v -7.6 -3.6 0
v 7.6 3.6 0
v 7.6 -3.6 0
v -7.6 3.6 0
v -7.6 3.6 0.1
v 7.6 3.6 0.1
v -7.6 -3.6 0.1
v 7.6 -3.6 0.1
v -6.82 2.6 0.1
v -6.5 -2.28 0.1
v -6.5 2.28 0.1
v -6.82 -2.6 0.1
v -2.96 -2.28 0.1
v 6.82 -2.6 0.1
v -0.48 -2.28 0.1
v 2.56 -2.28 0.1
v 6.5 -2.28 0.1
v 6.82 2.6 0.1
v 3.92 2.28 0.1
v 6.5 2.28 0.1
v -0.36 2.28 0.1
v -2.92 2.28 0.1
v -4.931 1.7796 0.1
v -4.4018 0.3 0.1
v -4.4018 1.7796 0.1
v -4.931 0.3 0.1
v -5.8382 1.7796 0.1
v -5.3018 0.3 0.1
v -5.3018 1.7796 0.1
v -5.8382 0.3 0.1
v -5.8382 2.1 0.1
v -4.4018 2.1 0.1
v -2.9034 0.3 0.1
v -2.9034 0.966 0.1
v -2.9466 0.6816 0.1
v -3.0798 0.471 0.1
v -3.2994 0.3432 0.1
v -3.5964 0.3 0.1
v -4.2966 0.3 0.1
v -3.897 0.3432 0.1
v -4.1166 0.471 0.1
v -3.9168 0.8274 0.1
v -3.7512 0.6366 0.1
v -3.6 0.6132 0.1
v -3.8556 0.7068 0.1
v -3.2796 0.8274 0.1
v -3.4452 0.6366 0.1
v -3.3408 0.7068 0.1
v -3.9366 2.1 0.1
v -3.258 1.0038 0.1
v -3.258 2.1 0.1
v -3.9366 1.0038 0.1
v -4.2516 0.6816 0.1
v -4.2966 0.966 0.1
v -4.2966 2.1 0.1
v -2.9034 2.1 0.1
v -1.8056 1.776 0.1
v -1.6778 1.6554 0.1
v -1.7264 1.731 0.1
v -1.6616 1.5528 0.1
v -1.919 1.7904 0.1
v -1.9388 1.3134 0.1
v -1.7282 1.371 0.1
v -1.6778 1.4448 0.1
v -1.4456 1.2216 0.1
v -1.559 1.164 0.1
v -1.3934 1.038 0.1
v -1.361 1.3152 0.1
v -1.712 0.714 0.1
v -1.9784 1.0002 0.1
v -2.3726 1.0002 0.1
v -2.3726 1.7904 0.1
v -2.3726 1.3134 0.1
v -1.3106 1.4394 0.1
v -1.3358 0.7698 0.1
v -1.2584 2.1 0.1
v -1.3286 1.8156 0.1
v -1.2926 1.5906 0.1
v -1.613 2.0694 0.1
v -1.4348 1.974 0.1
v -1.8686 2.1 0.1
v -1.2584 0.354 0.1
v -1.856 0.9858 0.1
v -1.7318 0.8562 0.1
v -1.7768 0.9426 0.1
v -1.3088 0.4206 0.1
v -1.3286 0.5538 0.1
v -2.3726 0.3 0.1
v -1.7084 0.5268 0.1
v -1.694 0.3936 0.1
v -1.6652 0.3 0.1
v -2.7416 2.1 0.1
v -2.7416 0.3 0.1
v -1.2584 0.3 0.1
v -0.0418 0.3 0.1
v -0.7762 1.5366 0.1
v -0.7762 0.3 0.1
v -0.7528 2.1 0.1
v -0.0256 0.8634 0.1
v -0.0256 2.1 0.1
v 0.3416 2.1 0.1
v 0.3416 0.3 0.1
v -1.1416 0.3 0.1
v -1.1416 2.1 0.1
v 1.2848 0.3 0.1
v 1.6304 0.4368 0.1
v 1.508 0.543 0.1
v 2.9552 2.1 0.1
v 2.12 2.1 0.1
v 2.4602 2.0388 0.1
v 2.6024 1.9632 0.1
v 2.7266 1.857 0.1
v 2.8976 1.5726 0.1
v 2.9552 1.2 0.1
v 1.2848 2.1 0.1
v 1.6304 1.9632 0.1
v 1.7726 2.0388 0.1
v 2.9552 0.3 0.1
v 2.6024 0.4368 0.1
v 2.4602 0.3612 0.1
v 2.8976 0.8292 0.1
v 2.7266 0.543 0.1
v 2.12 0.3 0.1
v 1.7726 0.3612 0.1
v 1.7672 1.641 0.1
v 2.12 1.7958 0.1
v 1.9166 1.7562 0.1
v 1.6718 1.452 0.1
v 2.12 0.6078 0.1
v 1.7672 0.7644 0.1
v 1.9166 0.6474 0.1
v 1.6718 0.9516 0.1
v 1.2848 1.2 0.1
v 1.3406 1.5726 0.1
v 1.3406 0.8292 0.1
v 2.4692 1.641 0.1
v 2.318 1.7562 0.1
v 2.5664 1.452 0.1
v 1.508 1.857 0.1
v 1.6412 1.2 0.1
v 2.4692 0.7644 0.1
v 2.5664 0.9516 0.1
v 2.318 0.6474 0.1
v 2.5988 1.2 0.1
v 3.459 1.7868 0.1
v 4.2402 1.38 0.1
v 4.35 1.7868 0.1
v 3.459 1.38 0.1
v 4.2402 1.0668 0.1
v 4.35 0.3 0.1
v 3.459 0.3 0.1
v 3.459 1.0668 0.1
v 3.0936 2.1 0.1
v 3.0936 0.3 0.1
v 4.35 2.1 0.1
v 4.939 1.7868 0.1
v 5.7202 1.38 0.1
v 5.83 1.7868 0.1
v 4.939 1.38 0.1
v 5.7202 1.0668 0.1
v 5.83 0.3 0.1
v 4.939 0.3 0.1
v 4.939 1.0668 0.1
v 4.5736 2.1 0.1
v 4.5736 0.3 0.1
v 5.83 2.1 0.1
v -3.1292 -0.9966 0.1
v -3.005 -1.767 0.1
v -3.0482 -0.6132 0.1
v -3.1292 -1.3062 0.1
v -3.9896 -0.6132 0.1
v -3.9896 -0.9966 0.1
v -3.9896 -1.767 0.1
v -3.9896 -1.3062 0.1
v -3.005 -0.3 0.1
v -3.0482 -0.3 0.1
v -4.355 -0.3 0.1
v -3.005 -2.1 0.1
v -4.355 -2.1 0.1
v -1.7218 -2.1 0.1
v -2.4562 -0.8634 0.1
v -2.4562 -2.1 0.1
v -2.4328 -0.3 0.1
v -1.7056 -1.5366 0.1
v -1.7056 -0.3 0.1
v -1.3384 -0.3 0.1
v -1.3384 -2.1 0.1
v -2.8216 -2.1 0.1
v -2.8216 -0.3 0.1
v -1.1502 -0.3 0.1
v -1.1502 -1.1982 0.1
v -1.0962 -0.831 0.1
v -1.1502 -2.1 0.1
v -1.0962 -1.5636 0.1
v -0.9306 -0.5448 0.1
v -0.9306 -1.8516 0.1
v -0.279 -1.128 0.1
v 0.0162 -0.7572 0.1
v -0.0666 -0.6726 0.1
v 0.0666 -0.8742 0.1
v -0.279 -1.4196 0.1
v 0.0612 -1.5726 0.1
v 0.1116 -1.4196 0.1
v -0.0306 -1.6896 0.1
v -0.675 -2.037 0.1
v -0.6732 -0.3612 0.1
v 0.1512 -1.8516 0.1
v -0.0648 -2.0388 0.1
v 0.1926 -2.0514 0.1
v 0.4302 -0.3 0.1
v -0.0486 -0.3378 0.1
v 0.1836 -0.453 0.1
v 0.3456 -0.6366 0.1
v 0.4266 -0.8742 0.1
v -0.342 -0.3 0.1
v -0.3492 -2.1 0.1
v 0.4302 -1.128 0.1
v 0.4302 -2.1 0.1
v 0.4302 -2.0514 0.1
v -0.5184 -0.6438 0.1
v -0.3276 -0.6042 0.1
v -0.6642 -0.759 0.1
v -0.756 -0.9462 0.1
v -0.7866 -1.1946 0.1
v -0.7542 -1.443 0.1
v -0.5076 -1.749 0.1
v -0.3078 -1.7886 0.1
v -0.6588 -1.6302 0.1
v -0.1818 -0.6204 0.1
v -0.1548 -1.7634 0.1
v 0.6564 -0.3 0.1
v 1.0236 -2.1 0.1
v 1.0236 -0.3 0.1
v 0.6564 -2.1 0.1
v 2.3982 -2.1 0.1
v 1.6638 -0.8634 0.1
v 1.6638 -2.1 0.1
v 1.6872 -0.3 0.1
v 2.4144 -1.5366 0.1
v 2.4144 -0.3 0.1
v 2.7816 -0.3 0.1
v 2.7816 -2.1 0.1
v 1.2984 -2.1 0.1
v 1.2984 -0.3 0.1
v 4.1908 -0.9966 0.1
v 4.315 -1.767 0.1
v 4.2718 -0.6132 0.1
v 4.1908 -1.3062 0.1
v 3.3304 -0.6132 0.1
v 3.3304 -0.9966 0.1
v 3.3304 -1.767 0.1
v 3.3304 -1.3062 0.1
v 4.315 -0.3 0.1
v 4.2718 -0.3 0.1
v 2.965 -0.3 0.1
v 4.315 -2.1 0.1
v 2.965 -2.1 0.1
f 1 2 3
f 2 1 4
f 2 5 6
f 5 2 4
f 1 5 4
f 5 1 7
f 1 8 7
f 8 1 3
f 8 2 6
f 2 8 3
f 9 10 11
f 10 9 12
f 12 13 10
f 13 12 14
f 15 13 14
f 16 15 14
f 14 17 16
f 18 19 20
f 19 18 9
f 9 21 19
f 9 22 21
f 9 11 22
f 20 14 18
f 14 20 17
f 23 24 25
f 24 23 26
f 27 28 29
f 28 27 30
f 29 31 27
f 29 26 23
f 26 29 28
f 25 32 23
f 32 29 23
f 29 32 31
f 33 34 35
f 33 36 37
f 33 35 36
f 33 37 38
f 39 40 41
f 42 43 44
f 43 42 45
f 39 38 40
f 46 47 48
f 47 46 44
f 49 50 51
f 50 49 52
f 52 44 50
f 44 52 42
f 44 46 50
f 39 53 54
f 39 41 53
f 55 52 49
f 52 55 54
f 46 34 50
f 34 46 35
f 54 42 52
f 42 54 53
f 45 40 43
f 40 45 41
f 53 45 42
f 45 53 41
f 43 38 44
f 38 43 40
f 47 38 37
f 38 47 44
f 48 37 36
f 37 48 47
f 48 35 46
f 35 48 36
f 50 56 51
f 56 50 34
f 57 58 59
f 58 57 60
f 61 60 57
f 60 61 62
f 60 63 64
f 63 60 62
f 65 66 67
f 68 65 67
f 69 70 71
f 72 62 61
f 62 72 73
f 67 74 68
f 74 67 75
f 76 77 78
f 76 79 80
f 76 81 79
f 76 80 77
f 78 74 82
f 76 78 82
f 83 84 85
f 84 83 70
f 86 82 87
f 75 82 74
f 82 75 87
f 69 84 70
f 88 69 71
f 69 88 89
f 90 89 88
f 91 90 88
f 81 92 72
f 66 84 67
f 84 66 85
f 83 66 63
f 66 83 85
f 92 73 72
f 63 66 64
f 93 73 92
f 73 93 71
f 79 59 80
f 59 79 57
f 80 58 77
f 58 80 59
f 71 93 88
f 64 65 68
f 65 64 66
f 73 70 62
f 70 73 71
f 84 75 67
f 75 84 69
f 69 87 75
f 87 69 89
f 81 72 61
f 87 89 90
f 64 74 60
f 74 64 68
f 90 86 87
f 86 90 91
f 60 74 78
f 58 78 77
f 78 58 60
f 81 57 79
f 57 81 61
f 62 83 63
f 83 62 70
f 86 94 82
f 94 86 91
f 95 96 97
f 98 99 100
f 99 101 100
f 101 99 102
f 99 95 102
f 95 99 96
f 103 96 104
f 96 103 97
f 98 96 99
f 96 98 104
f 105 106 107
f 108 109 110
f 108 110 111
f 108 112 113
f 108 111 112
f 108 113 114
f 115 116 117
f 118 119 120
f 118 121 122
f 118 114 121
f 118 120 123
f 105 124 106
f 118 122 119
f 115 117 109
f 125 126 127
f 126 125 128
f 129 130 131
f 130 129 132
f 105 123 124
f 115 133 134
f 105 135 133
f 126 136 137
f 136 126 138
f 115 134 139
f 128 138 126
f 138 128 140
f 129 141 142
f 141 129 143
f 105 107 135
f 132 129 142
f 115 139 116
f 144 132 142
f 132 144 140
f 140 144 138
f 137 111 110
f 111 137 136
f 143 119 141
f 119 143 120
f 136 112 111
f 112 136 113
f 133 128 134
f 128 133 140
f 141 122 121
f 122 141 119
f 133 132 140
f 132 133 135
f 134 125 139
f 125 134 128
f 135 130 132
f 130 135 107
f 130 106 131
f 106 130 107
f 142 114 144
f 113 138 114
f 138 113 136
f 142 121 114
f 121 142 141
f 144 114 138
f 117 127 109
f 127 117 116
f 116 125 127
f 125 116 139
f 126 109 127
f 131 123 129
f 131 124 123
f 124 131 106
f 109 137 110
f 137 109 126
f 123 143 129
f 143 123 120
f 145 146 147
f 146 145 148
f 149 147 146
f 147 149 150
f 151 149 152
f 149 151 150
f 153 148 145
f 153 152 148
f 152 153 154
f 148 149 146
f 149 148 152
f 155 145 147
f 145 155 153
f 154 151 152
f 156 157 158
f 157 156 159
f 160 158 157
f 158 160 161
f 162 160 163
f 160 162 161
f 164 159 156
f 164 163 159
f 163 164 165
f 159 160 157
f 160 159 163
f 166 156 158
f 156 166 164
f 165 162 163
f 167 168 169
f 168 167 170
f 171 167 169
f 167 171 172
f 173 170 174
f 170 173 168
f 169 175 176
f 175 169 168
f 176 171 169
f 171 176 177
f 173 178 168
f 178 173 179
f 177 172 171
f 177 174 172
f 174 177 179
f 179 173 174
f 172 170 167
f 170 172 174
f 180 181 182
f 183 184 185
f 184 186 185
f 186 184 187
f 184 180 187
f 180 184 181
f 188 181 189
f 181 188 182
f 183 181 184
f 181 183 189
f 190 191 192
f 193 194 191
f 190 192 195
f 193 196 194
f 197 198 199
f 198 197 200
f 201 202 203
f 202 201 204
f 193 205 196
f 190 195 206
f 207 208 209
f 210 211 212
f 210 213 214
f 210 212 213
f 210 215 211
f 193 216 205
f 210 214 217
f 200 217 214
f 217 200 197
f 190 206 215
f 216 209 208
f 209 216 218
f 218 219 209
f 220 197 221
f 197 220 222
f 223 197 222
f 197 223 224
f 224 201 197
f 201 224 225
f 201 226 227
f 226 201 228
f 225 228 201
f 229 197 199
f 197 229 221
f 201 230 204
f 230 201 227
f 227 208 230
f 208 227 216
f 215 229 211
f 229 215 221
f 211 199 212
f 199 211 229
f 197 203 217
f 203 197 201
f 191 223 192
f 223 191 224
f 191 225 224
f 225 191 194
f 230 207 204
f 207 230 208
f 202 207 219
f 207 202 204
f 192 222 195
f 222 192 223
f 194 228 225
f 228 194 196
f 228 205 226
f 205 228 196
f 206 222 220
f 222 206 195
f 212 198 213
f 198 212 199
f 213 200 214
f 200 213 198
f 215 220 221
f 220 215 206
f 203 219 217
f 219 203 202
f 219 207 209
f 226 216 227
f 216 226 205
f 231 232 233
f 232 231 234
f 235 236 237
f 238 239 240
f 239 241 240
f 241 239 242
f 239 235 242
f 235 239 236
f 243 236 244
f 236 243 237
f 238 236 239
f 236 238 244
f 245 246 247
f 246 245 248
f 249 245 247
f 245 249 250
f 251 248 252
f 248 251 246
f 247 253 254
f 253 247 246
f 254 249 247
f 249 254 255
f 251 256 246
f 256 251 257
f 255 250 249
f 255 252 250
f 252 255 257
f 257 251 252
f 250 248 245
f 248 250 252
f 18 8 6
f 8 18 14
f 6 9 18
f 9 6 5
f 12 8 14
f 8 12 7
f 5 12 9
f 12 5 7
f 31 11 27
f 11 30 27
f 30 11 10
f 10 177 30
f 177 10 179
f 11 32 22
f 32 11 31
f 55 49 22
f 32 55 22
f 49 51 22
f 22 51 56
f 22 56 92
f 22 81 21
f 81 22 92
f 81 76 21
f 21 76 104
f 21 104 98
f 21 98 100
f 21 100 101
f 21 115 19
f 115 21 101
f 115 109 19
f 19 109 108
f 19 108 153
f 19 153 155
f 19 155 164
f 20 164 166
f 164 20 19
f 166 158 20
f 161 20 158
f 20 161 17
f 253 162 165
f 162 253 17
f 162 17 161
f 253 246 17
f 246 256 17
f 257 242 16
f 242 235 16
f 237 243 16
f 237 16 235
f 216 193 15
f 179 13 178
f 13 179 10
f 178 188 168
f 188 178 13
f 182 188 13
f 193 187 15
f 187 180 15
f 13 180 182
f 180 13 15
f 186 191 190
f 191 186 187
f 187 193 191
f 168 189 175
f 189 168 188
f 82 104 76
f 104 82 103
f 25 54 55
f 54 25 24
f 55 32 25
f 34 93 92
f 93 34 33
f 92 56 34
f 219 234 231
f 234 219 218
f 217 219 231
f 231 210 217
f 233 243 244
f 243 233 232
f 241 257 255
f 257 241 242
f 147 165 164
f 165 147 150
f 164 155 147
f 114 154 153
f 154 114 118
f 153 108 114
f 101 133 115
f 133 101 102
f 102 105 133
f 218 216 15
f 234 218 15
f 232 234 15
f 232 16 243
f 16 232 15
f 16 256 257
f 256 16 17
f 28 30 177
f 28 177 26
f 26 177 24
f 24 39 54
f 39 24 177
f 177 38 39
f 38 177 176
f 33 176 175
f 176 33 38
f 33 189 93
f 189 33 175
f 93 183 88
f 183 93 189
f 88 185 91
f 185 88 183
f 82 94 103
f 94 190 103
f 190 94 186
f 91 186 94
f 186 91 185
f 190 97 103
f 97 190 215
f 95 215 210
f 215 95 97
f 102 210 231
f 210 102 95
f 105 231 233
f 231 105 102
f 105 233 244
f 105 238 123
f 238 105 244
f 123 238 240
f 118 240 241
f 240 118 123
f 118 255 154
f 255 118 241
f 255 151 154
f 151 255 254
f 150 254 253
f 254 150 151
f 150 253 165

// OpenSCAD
use <../lib.scad>
use <../p/box5-12.scad>
use <../p/type-swiss721bt-bold-ue.scad>
use <../p/type-swiss721bt-bold-uf.scad>
use <../p/type-swiss721bt-bold-ug.scad>
use <../p/type-swiss721bt-bold-ui.scad>
use <../p/type-swiss721bt-bold-un.scad>
use <../p/type-swiss721bt-bold-uo.scad>
use <../p/type-swiss721bt-bold-ur.scad>
use <../p/type-swiss721bt-bold-ut.scad>
use <../p/type-swiss721bt-bold-uu.scad>
$fa=1; $fs=0.2;
function ldraw_lib__193445e(realsolid=false) = [
// 0 Sticker  0.9 x  1.9 with Black "TURN OFF ENGINE" and Frame on Clear Background
// 0 Name: 193445e.dat
// 0 Author: Ulrich Röder [UR]
// 0 !LDRAW_ORG Part UPDATE 2020-03
// 0 !LICENSE Licensed under CC BY 2.0 and CC BY 4.0 : see CAreadme.txt
// 
// 0 BFC CERTIFY CCW
  [0,"BFC","CERTIFY"],
  [0,"BFC","CCW"],
// 
// 0 !KEYWORDS Set 5590
// 
// 0 !HISTORY 2018-12-08 [PTadmin] Official Update 2018-02
// 0 !HISTORY 2020-12-08 [UR] Bold Text and Frame, Primitives, Dimensions
// 0 !HISTORY 2020-12-29 [PTadmin] Official Update 2020-03
// 
// 
// 0 // Main
// 1 16 0 -0.25 0 19 0 0 0 0.25 0 0 0 9 box5-12.dat
  [1,16,0,-0.25,0,19,0,0,0,0.25,0,0,0,9, ldraw_lib__box5_12(realsolid)],
// 
// 4 0 -16.25 -.25 -5.7 -16.25 -.25 5.7 -17.05 -.25 6.5 -17.05 -.25 -6.5
  [4,0,-16.25,-.25,-5.7,-16.25,-.25,5.7,-17.05,-.25,6.5,-17.05,-.25,-6.5],
// 4 0 -7.4 -.25 -5.7 -16.25 -.25 -5.7 -17.05 -.25 -6.5 17.05 -.25 -6.5
  [4,0,-7.4,-.25,-5.7,-16.25,-.25,-5.7,-17.05,-.25,-6.5,17.05,-.25,-6.5],
// 3 0 -1.2 -.25 -5.7 -7.4 -.25 -5.7 17.05 -.25 -6.5
  [3,0,-1.2,-.25,-5.7,-7.4,-.25,-5.7,17.05,-.25,-6.5],
// 3 0 6.4 -.25 -5.7 -1.2 -.25 -5.7 17.05 -.25 -6.5
  [3,0,6.4,-.25,-5.7,-1.2,-.25,-5.7,17.05,-.25,-6.5],
// 3 0 17.05 -.25 -6.5 16.25 -.25 -5.7 6.4 -.25 -5.7
  [3,0,17.05,-.25,-6.5,16.25,-.25,-5.7,6.4,-.25,-5.7],
// 4 0 9.8 -.25 5.7 16.25 -.25 5.7 17.05 -.25 6.5 -17.05 -.25 6.5
  [4,0,9.8,-.25,5.7,16.25,-.25,5.7,17.05,-.25,6.5,-17.05,-.25,6.5],
// 3 0 -17.05 -.25 6.5 -.9 -.25 5.7 9.8 -.25 5.7
  [3,0,-17.05,-.25,6.5,-.9,-.25,5.7,9.8,-.25,5.7],
// 3 0 -17.05 -.25 6.5 -7.3 -.25 5.7 -.9 -.25 5.7
  [3,0,-17.05,-.25,6.5,-7.3,-.25,5.7,-.9,-.25,5.7],
// 3 0 -17.05 -.25 6.5 -16.25 -.25 5.7 -7.3 -.25 5.7
  [3,0,-17.05,-.25,6.5,-16.25,-.25,5.7,-7.3,-.25,5.7],
// 4 0 16.25 -.25 -5.7 17.05 -.25 -6.5 17.05 -.25 6.5 16.25 -.25 5.7
  [4,0,16.25,-.25,-5.7,17.05,-.25,-6.5,17.05,-.25,6.5,16.25,-.25,5.7],
// 
// 0 // Text
// 1 16 -12.8 -.25 3 4.5 0 0 0 1 0 0 0 4.5 type-swiss721bt-bold-ut.dat
  [1,16,-12.8,-.25,3,4.5,0,0,0,1,0,0,0,4.5, ldraw_lib__type_swiss721bt_bold_ut(realsolid)],
// 1 16 -9 -.25 3 4.5 0 0 0 1 0 0 0 4.5 type-swiss721bt-bold-uu.dat
  [1,16,-9,-.25,3,4.5,0,0,0,1,0,0,0,4.5, ldraw_lib__type_swiss721bt_bold_uu(realsolid)],
// 1 16 -5 -.25 3 4.5 0 0 0 1 0 0 0 4.5 type-swiss721bt-bold-ur.dat
  [1,16,-5,-.25,3,4.5,0,0,0,1,0,0,0,4.5, ldraw_lib__type_swiss721bt_bold_ur(realsolid)],
// 1 16 -1 -.25 3 4.5 0 0 0 1 0 0 0 4.5 type-swiss721bt-bold-un.dat
  [1,16,-1,-.25,3,4.5,0,0,0,1,0,0,0,4.5, ldraw_lib__type_swiss721bt_bold_un(realsolid)],
// 1 16 5.3 -.25 3 4.5 0 0 0 1 0 0 0 4.5 type-swiss721bt-bold-uo.dat
  [1,16,5.3,-.25,3,4.5,0,0,0,1,0,0,0,4.5, ldraw_lib__type_swiss721bt_bold_uo(realsolid)],
// 1 16 9.3 -.25 3 4.5 0 0 0 1 0 0 0 4.5 type-swiss721bt-bold-uf.dat
  [1,16,9.3,-.25,3,4.5,0,0,0,1,0,0,0,4.5, ldraw_lib__type_swiss721bt_bold_uf(realsolid)],
// 1 16 13 -.25 3 4.5 0 0 0 1 0 0 0 4.5 type-swiss721bt-bold-uf.dat
  [1,16,13,-.25,3,4.5,0,0,0,1,0,0,0,4.5, ldraw_lib__type_swiss721bt_bold_uf(realsolid)],
// 1 16 -9.2 -.25 -3 4.5 0 0 0 1 0 0 0 4.5 type-swiss721bt-bold-ue.dat
  [1,16,-9.2,-.25,-3,4.5,0,0,0,1,0,0,0,4.5, ldraw_lib__type_swiss721bt_bold_ue(realsolid)],
// 1 16 -5.2 -.25 -3 4.5 0 0 0 1 0 0 0 4.5 type-swiss721bt-bold-un.dat
  [1,16,-5.2,-.25,-3,4.5,0,0,0,1,0,0,0,4.5, ldraw_lib__type_swiss721bt_bold_un(realsolid)],
// 1 16 -.9 -.25 -3 4.5 0 0 0 1 0 0 0 4.5 type-swiss721bt-bold-ug.dat
  [1,16,-.9,-.25,-3,4.5,0,0,0,1,0,0,0,4.5, ldraw_lib__type_swiss721bt_bold_ug(realsolid)],
// 1 16 2.1 -.25 -3 4.5 0 0 0 1 0 0 0 4.5 type-swiss721bt-bold-ui.dat
  [1,16,2.1,-.25,-3,4.5,0,0,0,1,0,0,0,4.5, ldraw_lib__type_swiss721bt_bold_ui(realsolid)],
// 1 16 5.1 -.25 -3 4.5 0 0 0 1 0 0 0 4.5 type-swiss721bt-bold-un.dat
  [1,16,5.1,-.25,-3,4.5,0,0,0,1,0,0,0,4.5, ldraw_lib__type_swiss721bt_bold_un(realsolid)],
// 1 16 9.1 -.25 -3 4.5 0 0 0 1 0 0 0 4.5 type-swiss721bt-bold-ue.dat
  [1,16,9.1,-.25,-3,4.5,0,0,0,1,0,0,0,4.5, ldraw_lib__type_swiss721bt_bold_ue(realsolid)],
// 
// 0 // Clear
// 4 16 19 -.25 9 17.05 -.25 6.5 17.05 -.25 -6.5 19 -.25 -9
  [4,16,19,-.25,9,17.05,-.25,6.5,17.05,-.25,-6.5,19,-.25,-9],
// 4 16 -17.05 -.25 6.5 17.05 -.25 6.5 19 -.25 9 -19 -.25 9
  [4,16,-17.05,-.25,6.5,17.05,-.25,6.5,19,-.25,9,-19,-.25,9],
// 4 16 19 -.25 -9 17.05 -.25 -6.5 -17.05 -.25 -6.5 -19 -.25 -9
  [4,16,19,-.25,-9,17.05,-.25,-6.5,-17.05,-.25,-6.5,-19,-.25,-9],
// 4 16 -19 -.25 -9 -17.05 -.25 -6.5 -17.05 -.25 6.5 -19 -.25 9
  [4,16,-19,-.25,-9,-17.05,-.25,-6.5,-17.05,-.25,6.5,-19,-.25,9],
// 3 16 -14.5955 -.25 5.25 -16.25 -.25 5.7 -14.5955 -.25 4.449
  [3,16,-14.5955,-.25,5.25,-16.25,-.25,5.7,-14.5955,-.25,4.449],
// 4 16 -14.5955 -.25 4.449 -16.25 -.25 5.7 -16.25 -.25 -5.7 -14.5955 -.25 .75
  [4,16,-14.5955,-.25,4.449,-16.25,-.25,5.7,-16.25,-.25,-5.7,-14.5955,-.25,.75],
// 4 16 -16.25 -.25 -5.7 -10.8875 -.25 -5.25 -10.8875 -.25 -.75 -14.5955 -.25 .75
  [4,16,-16.25,-.25,-5.7,-10.8875,-.25,-5.25,-10.8875,-.25,-.75,-14.5955,-.25,.75],
// 4 16 -14.5955 -.25 5.25 -11.0045 -.25 5.25 -7.3 -.25 5.7 -16.25 -.25 5.7
  [4,16,-14.5955,-.25,5.25,-11.0045,-.25,5.25,-7.3,-.25,5.7,-16.25,-.25,5.7],
// 3 16 -10.7415 -.25 5.25 -9.8415 -.25 5.25 -7.3 -.25 5.7
  [3,16,-10.7415,-.25,5.25,-9.8415,-.25,5.25,-7.3,-.25,5.7],
// 3 16 -11.0045 -.25 5.25 -10.7415 -.25 5.25 -7.3 -.25 5.7
  [3,16,-11.0045,-.25,5.25,-10.7415,-.25,5.25,-7.3,-.25,5.7],
// 3 16 -9.8415 -.25 5.25 -8.145 -.25 5.25 -7.3 -.25 5.7
  [3,16,-9.8415,-.25,5.25,-8.145,-.25,5.25,-7.3,-.25,5.7],
// 3 16 -7.3 -.25 5.7 -8.145 -.25 5.25 -7.2585 -.25 5.25
  [3,16,-7.3,-.25,5.7,-8.145,-.25,5.25,-7.2585,-.25,5.25],
// 3 16 -7.3 -.25 5.7 -7.2585 -.25 5.25 -6.854 -.25 5.25
  [3,16,-7.3,-.25,5.7,-7.2585,-.25,5.25,-6.854,-.25,5.25],
// 4 16 -6.854 -.25 5.25 -4.6715 -.25 5.25 -.9 -.25 5.7 -7.3 -.25 5.7
  [4,16,-6.854,-.25,5.25,-4.6715,-.25,5.25,-.9,-.25,5.7,-7.3,-.25,5.7],
// 3 16 -4.6715 -.25 5.25 -3.146 -.25 5.25 -.9 -.25 5.7
  [3,16,-4.6715,-.25,5.25,-3.146,-.25,5.25,-.9,-.25,5.7],
// 3 16 -.9 -.25 5.7 -3.146 -.25 5.25 -2.854 -.25 5.25
  [3,16,-.9,-.25,5.7,-3.146,-.25,5.25,-2.854,-.25,5.25],
// 3 16 -.9 -.25 5.7 -2.854 -.25 5.25 -1.882 -.25 5.25
  [3,16,-.9,-.25,5.7,-2.854,-.25,5.25,-1.882,-.25,5.25],
// 3 16 -.9 -.25 5.7 -1.882 -.25 5.25 -.064 -.25 5.25
  [3,16,-.9,-.25,5.7,-1.882,-.25,5.25,-.064,-.25,5.25],
// 3 16 -.9 -.25 5.7 -.064 -.25 5.25 .854 -.25 5.25
  [3,16,-.9,-.25,5.7,-.064,-.25,5.25,.854,-.25,5.25],
// 4 16 .854 -.25 5.25 3.212 -.25 5.25 9.8 -.25 5.7 -.9 -.25 5.7
  [4,16,.854,-.25,5.25,3.212,-.25,5.25,9.8,-.25,5.7,-.9,-.25,5.7],
// 3 16 3.212 -.25 5.25 5.3 -.25 5.25 9.8 -.25 5.7
  [3,16,3.212,-.25,5.25,5.3,-.25,5.25,9.8,-.25,5.7],
// 3 16 9.8 -.25 5.7 5.3 -.25 5.25 7.388 -.25 5.25
  [3,16,9.8,-.25,5.7,5.3,-.25,5.25,7.388,-.25,5.25],
// 3 16 9.8 -.25 5.7 7.388 -.25 5.25 7.734 -.25 5.25
  [3,16,9.8,-.25,5.7,7.388,-.25,5.25,7.734,-.25,5.25],
// 3 16 9.8 -.25 5.7 7.734 -.25 5.25 10.875 -.25 5.25
  [3,16,9.8,-.25,5.7,7.734,-.25,5.25,10.875,-.25,5.25],
// 3 16 9.8 -.25 5.7 10.875 -.25 5.25 11.434 -.25 5.25
  [3,16,9.8,-.25,5.7,10.875,-.25,5.25,11.434,-.25,5.25],
// 4 16 11.434 -.25 5.25 14.575 -.25 5.25 16.25 -.25 5.7 9.8 -.25 5.7
  [4,16,11.434,-.25,5.25,14.575,-.25,5.25,16.25,-.25,5.7,9.8,-.25,5.7],
// 3 16 14.575 -.25 5.25 14.575 -.25 4.467 16.25 -.25 5.7
  [3,16,14.575,-.25,5.25,14.575,-.25,4.467,16.25,-.25,5.7],
// 4 16 16.25 -.25 -5.7 16.25 -.25 5.7 14.575 -.25 4.467 14.575 -.25 .75
  [4,16,16.25,-.25,-5.7,16.25,-.25,5.7,14.575,-.25,4.467,14.575,-.25,.75],
// 4 16 11.434 -.25 .75 10.7875 -.25 -.75 16.25 -.25 -5.7 12.3475 -.25 .75
  [4,16,11.434,-.25,.75,10.7875,-.25,-.75,16.25,-.25,-5.7,12.3475,-.25,.75],
// 3 16 12.3475 -.25 .75 16.25 -.25 -5.7 14.575 -.25 .75
  [3,16,12.3475,-.25,.75,16.25,-.25,-5.7,14.575,-.25,.75],
// 3 16 10.7875 -.25 -.75 10.7875 -.25 -4.4175 16.25 -.25 -5.7
  [3,16,10.7875,-.25,-.75,10.7875,-.25,-4.4175,16.25,-.25,-5.7],
// 3 16 10.7875 -.25 -4.4175 10.7875 -.25 -5.25 16.25 -.25 -5.7
  [3,16,10.7875,-.25,-4.4175,10.7875,-.25,-5.25,16.25,-.25,-5.7],
// 3 16 7.4125 -.25 -5.25 6.954 -.25 -5.25 6.4 -.25 -5.7
  [3,16,7.4125,-.25,-5.25,6.954,-.25,-5.25,6.4,-.25,-5.7],
// 3 16 6.954 -.25 -5.25 5.9955 -.25 -5.25 6.4 -.25 -5.7
  [3,16,6.954,-.25,-5.25,5.9955,-.25,-5.25,6.4,-.25,-5.7],
// 3 16 4.1595 -.25 -5.25 3.246 -.25 -5.25 6.4 -.25 -5.7
  [3,16,4.1595,-.25,-5.25,3.246,-.25,-5.25,6.4,-.25,-5.7],
// 3 16 4.1595 -.25 -5.25 6.4 -.25 -5.7 5.9955 -.25 -5.25
  [3,16,4.1595,-.25,-5.25,6.4,-.25,-5.7,5.9955,-.25,-5.25],
// 3 16 -.873 -.25 -5.25 -2.8755 -.25 -5.25 -1.2 -.25 -5.7
  [3,16,-.873,-.25,-5.25,-2.8755,-.25,-5.25,-1.2,-.25,-5.7],
// 4 16 -16.25 -.25 -5.7 -7.4 -.25 -5.7 -7.5125 -.25 -5.25 -10.8875 -.25 -5.25
  [4,16,-16.25,-.25,-5.7,-7.4,-.25,-5.7,-7.5125,-.25,-5.25,-10.8875,-.25,-5.25],
// 4 16 -7.4 -.25 -5.7 -7.054 -.25 -5.25 -7.5125 -.25 -4.4175 -7.5125 -.25 -5.25
  [4,16,-7.4,-.25,-5.7,-7.054,-.25,-5.25,-7.5125,-.25,-4.4175,-7.5125,-.25,-5.25],
// 3 16 -6.1405 -.25 -5.25 -7.054 -.25 -5.25 -7.4 -.25 -5.7
  [3,16,-6.1405,-.25,-5.25,-7.054,-.25,-5.25,-7.4,-.25,-5.7],
// 3 16 -2.8755 -.25 -5.25 -3.346 -.25 -5.25 -1.2 -.25 -5.7
  [3,16,-2.8755,-.25,-5.25,-3.346,-.25,-5.25,-1.2,-.25,-5.7],
// 3 16 -3.346 -.25 -5.25 -4.3045 -.25 -5.25 -1.2 -.25 -5.7
  [3,16,-3.346,-.25,-5.25,-4.3045,-.25,-5.25,-1.2,-.25,-5.7],
// 4 16 -4.3045 -.25 -5.25 -6.1405 -.25 -5.25 -7.4 -.25 -5.7 -1.2 -.25 -5.7
  [4,16,-4.3045,-.25,-5.25,-6.1405,-.25,-5.25,-7.4,-.25,-5.7,-1.2,-.25,-5.7],
// 4 16 -3.346 -.25 -.75 -3.346 -.25 -5.25 -2.8755 -.25 -2.9955 -2.8755 -.25 -.75
  [4,16,-3.346,-.25,-.75,-3.346,-.25,-5.25,-2.8755,-.25,-2.9955,-2.8755,-.25,-.75],
// 3 16 -3.346 -.25 -5.25 -2.8755 -.25 -5.25 -2.8755 -.25 -2.9955
  [3,16,-3.346,-.25,-5.25,-2.8755,-.25,-5.25,-2.8755,-.25,-2.9955],
// 4 16 -7.054 -.25 -5.25 -7.054 -.25 -.75 -7.5125 -.25 -.75 -7.5125 -.25 -4.4175
  [4,16,-7.054,-.25,-5.25,-7.054,-.25,-.75,-7.5125,-.25,-.75,-7.5125,-.25,-4.4175],
// 4 16 -3.146 -.25 .885 -2.854 -.25 .75 -2.854 -.25 5.25 -3.146 -.25 5.25
  [4,16,-3.146,-.25,.885,-2.854,-.25,.75,-2.854,-.25,5.25,-3.146,-.25,5.25],
// 4 16 -10.7415 -.25 2.415 -10.7415 -.25 5.25 -11.0045 -.25 4.449 -11.0045 -.25 .75
  [4,16,-10.7415,-.25,2.415,-10.7415,-.25,5.25,-11.0045,-.25,4.449,-11.0045,-.25,.75],
// 3 16 -10.7415 -.25 5.25 -11.0045 -.25 5.25 -11.0045 -.25 4.449
  [3,16,-10.7415,-.25,5.25,-11.0045,-.25,5.25,-11.0045,-.25,4.449],
// 4 16 -7.2585 -.25 2.415 -7.2585 -.25 .75 -6.854 -.25 .75 -6.854 -.25 5.25
  [4,16,-7.2585,-.25,2.415,-7.2585,-.25,.75,-6.854,-.25,.75,-6.854,-.25,5.25],
// 3 16 -6.854 -.25 5.25 -7.2585 -.25 5.25 -7.2585 -.25 2.415
  [3,16,-6.854,-.25,5.25,-7.2585,-.25,5.25,-7.2585,-.25,2.415],
// 4 16 1.641 -.25 -5.25 1.641 -.25 -.75 1.0755 -.25 -5.1285 1.0755 -.25 -5.25
  [4,16,1.641,-.25,-5.25,1.641,-.25,-.75,1.0755,-.25,-5.1285,1.0755,-.25,-5.25],
// 3 16 1.0755 -.25 -2.82 1.0755 -.25 -5.1285 1.641 -.25 -.75
  [3,16,1.0755,-.25,-2.82,1.0755,-.25,-5.1285,1.641,-.25,-.75],
// 3 16 1.641 -.25 -.75 1.0755 -.25 -.75 1.0755 -.25 -2.82
  [3,16,1.641,-.25,-.75,1.0755,-.25,-.75,1.0755,-.25,-2.82],
// 4 16 3.246 -.25 -.75 2.559 -.25 -.75 2.559 -.25 -5.25 3.246 -.25 -5.25
  [4,16,3.246,-.25,-.75,2.559,-.25,-.75,2.559,-.25,-5.25,3.246,-.25,-5.25],
// 4 16 7.4125 -.25 -.75 6.954 -.25 -.75 6.954 -.25 -5.25 7.4125 -.25 -5.25
  [4,16,7.4125,-.25,-.75,6.954,-.25,-.75,6.954,-.25,-5.25,7.4125,-.25,-5.25],
// 4 16 10.875 -.25 4.467 10.875 -.25 .75 11.434 -.25 .75 11.434 -.25 5.25
  [4,16,10.875,-.25,4.467,10.875,-.25,.75,11.434,-.25,.75,11.434,-.25,5.25],
// 3 16 11.434 -.25 5.25 10.875 -.25 5.25 10.875 -.25 4.467
  [3,16,11.434,-.25,5.25,10.875,-.25,5.25,10.875,-.25,4.467],
// 4 16 7.388 -.25 3 7.388 -.25 .75 7.734 -.25 .75 7.734 -.25 5.25
  [4,16,7.388,-.25,3,7.388,-.25,.75,7.734,-.25,.75,7.734,-.25,5.25],
// 3 16 7.734 -.25 5.25 7.388 -.25 5.25 7.388 -.25 3
  [3,16,7.734,-.25,5.25,7.388,-.25,5.25,7.388,-.25,3],
// 4 16 .854 -.25 5.25 .854 -.25 .75 3.212 -.25 3 3.212 -.25 5.25
  [4,16,.854,-.25,5.25,.854,-.25,.75,3.212,-.25,3,3.212,-.25,5.25],
// 3 16 .854 -.25 .75 3.212 -.25 .75 3.212 -.25 3
  [3,16,.854,-.25,.75,3.212,-.25,.75,3.212,-.25,3],
// 3 16 1.0755 -.25 -5.25 -.873 -.25 -5.25 -1.2 -.25 -5.7
  [3,16,1.0755,-.25,-5.25,-.873,-.25,-5.25,-1.2,-.25,-5.7],
// 3 16 1.641 -.25 -5.25 1.0755 -.25 -5.25 -1.2 -.25 -5.7
  [3,16,1.641,-.25,-5.25,1.0755,-.25,-5.25,-1.2,-.25,-5.7],
// 3 16 2.559 -.25 -5.25 1.641 -.25 -5.25 -1.2 -.25 -5.7
  [3,16,2.559,-.25,-5.25,1.641,-.25,-5.25,-1.2,-.25,-5.7],
// 4 16 -1.2 -.25 -5.7 6.4 -.25 -5.7 3.246 -.25 -5.25 2.559 -.25 -5.25
  [4,16,-1.2,-.25,-5.7,6.4,-.25,-5.7,3.246,-.25,-5.25,2.559,-.25,-5.25],
// 4 16 10.7875 -.25 -5.25 7.4125 -.25 -5.25 6.4 -.25 -5.7 16.25 -.25 -5.7
  [4,16,10.7875,-.25,-5.25,7.4125,-.25,-5.25,6.4,-.25,-5.7,16.25,-.25,-5.7],
// 3 16 -13.2545 -.25 .75 -14.5955 -.25 .75 -10.8875 -.25 -.75
  [3,16,-13.2545,-.25,.75,-14.5955,-.25,.75,-10.8875,-.25,-.75],
// 3 16 -13.2545 -.25 .75 -10.8875 -.25 -.75 -12.3275 -.25 .75
  [3,16,-13.2545,-.25,.75,-10.8875,-.25,-.75,-12.3275,-.25,.75],
// 3 16 -12.3275 -.25 .75 -10.8875 -.25 -.75 -11.0045 -.25 .75
  [3,16,-12.3275,-.25,.75,-10.8875,-.25,-.75,-11.0045,-.25,.75],
// 4 16 -10.7415 -.25 2.415 -11.0045 -.25 .75 -10.8875 -.25 -.75 -10.7415 -.25 .75
  [4,16,-10.7415,-.25,2.415,-11.0045,-.25,.75,-10.8875,-.25,-.75,-10.7415,-.25,.75],
// 4 16 -10.8875 -.25 -.75 -7.6205 -.25 -.75 -8.991 -.25 .75 -10.7415 -.25 .75
  [4,16,-10.8875,-.25,-.75,-7.6205,-.25,-.75,-8.991,-.25,.75,-10.7415,-.25,.75],
// 4 16 -8.991 -.25 .75 -7.6205 -.25 -.75 -7.5125 -.25 -.75 -7.2585 -.25 .75
  [4,16,-8.991,-.25,.75,-7.6205,-.25,-.75,-7.5125,-.25,-.75,-7.2585,-.25,.75],
// 4 16 -6.854 -.25 .75 -7.2585 -.25 .75 -7.5125 -.25 -.75 -7.054 -.25 -.75
  [4,16,-6.854,-.25,.75,-7.2585,-.25,.75,-7.5125,-.25,-.75,-7.054,-.25,-.75],
// 4 16 -5.9315 -.25 .75 -6.854 -.25 .75 -7.054 -.25 -.75 -6.082 -.25 -.75
  [4,16,-5.9315,-.25,.75,-6.854,-.25,.75,-7.054,-.25,-.75,-6.082,-.25,-.75],
// 4 16 -4.163 -.25 .75 -5.9315 -.25 .75 -6.082 -.25 -.75 -4.264 -.25 -.75
  [4,16,-4.163,-.25,.75,-5.9315,-.25,.75,-6.082,-.25,-.75,-4.264,-.25,-.75],
// 3 16 -3.146 -.25 .885 -3.146 -.25 .75 -2.854 -.25 .75
  [3,16,-3.146,-.25,.885,-3.146,-.25,.75,-2.854,-.25,.75],
// 4 16 -2.854 -.25 .75 -3.146 -.25 .75 -3.346 -.25 -.75 -2.8755 -.25 -.75
  [4,16,-2.854,-.25,.75,-3.146,-.25,.75,-3.346,-.25,-.75,-2.8755,-.25,-.75],
// 4 16 -3.146 -.25 .75 -4.163 -.25 .75 -4.264 -.25 -.75 -3.346 -.25 -.75
  [4,16,-3.146,-.25,.75,-4.163,-.25,.75,-4.264,-.25,-.75,-3.346,-.25,-.75],
// 4 16 -1.9405 -.25 .75 -2.854 -.25 .75 -2.8755 -.25 -.75 -.855 -.25 -.75
  [4,16,-1.9405,-.25,.75,-2.854,-.25,.75,-2.8755,-.25,-.75,-.855,-.25,-.75],
// 4 16 -.1045 -.25 .75 -1.9405 -.25 .75 -.855 -.25 -.75 1.0755 -.25 -.75
  [4,16,-.1045,-.25,.75,-1.9405,-.25,.75,-.855,-.25,-.75,1.0755,-.25,-.75],
// 4 16 .854 -.25 .75 -.1045 -.25 .75 1.0755 -.25 -.75 1.641 -.25 -.75
  [4,16,.854,-.25,.75,-.1045,-.25,.75,1.0755,-.25,-.75,1.641,-.25,-.75],
// 4 16 3.212 -.25 .75 .854 -.25 .75 1.641 -.25 -.75 2.559 -.25 -.75
  [4,16,3.212,-.25,.75,.854,-.25,.75,1.641,-.25,-.75,2.559,-.25,-.75],
// 3 16 3.212 -.25 .75 2.559 -.25 -.75 3.246 -.25 -.75
  [3,16,3.212,-.25,.75,2.559,-.25,-.75,3.246,-.25,-.75],
// 4 16 5.3 -.25 .75 3.212 -.25 .75 3.246 -.25 -.75 4.218 -.25 -.75
  [4,16,5.3,-.25,.75,3.212,-.25,.75,3.246,-.25,-.75,4.218,-.25,-.75],
// 3 16 5.3 -.25 .75 4.218 -.25 -.75 6.036 -.25 -.75
  [3,16,5.3,-.25,.75,4.218,-.25,-.75,6.036,-.25,-.75],
// 4 16 7.388 -.25 .75 5.3 -.25 .75 6.036 -.25 -.75 6.954 -.25 -.75
  [4,16,7.388,-.25,.75,5.3,-.25,.75,6.036,-.25,-.75,6.954,-.25,-.75],
// 4 16 7.4125 -.25 -.75 7.734 -.25 .75 7.388 -.25 .75 6.954 -.25 -.75
  [4,16,7.4125,-.25,-.75,7.734,-.25,.75,7.388,-.25,.75,6.954,-.25,-.75],
// 4 16 7.734 -.25 .75 7.4125 -.25 -.75 10.6795 -.25 -.75 8.6475 -.25 .75
  [4,16,7.734,-.25,.75,7.4125,-.25,-.75,10.6795,-.25,-.75,8.6475,-.25,.75],
// 4 16 10.7875 -.25 -.75 10.875 -.25 .75 8.6475 -.25 .75 10.6795 -.25 -.75
  [4,16,10.7875,-.25,-.75,10.875,-.25,.75,8.6475,-.25,.75,10.6795,-.25,-.75],
// 3 16 10.875 -.25 .75 10.7875 -.25 -.75 11.434 -.25 .75
  [3,16,10.875,-.25,.75,10.7875,-.25,-.75,11.434,-.25,.75],
];
module ldraw_lib__193445e(step=0, col=false, unit=2/5, alt=false, line=0.2, solid=!$preview)
    makepoly(ldraw_lib__193445e(solid), step=step, col=col, unit=unit, alt=alt, line=line, solid=solid);
ldraw_lib__193445e(line=0.2);
